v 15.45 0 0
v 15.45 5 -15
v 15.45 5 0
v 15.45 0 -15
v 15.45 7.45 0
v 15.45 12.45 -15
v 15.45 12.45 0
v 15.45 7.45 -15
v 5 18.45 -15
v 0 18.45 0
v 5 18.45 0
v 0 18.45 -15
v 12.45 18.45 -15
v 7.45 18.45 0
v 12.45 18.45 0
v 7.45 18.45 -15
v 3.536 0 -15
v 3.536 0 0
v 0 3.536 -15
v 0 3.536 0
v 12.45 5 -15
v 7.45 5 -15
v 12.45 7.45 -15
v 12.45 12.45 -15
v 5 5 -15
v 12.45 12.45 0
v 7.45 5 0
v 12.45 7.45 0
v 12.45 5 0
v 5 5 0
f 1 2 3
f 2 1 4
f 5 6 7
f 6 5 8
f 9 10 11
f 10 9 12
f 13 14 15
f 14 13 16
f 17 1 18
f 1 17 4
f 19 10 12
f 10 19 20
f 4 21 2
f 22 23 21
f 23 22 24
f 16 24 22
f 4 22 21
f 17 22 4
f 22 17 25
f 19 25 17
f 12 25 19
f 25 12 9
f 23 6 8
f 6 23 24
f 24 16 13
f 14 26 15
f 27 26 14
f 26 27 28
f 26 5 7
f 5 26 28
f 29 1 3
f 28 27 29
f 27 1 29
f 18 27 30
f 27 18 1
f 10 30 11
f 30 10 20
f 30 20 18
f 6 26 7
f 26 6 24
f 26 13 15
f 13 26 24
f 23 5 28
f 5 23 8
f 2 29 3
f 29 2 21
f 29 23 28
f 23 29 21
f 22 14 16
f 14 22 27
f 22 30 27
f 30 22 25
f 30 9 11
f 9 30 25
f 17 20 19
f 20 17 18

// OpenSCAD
GLASS_THICKNESS=2.45;
WALL_THICK=5;
WALL_LENGTH=30;

CORNER_ENTIRE_WIDTH=2*WALL_THICK + GLASS_THICKNESS;
echo("CORNER_ENTIRE_WIDTH=", CORNER_ENTIRE_WIDTH);

module joint() {  
  
  difference()
  {
    cube([CORNER_ENTIRE_WIDTH + 3, WALL_LENGTH / 2, CORNER_ENTIRE_WIDTH + 6]);  

    // Remove the large chunk from the middle to form the walls
    translate([CORNER_ENTIRE_WIDTH, -0.01, CORNER_ENTIRE_WIDTH])
      cube([WALL_LENGTH, WALL_LENGTH + 0.02 , WALL_LENGTH]);
   
    translate([CORNER_ENTIRE_WIDTH, -0.01 , WALL_THICK])
      cube([WALL_LENGTH, WALL_LENGTH + 0.02, GLASS_THICKNESS]);
    
    translate([WALL_THICK, -0.01, WALL_THICK])
      cube([GLASS_THICKNESS, WALL_LENGTH + 0.02, WALL_LENGTH]);
    
    // Knock down sharp corders on other exposed sides
    rotate(45, [0,1,0])
      translate([-WALL_THICK/2, -1, -WALL_THICK/2])
        cube([WALL_THICK, WALL_LENGTH + 2, WALL_THICK]);
   
  }
}


// Rotate for printing
rotate(-90,[1,0,0])
joint();


    
